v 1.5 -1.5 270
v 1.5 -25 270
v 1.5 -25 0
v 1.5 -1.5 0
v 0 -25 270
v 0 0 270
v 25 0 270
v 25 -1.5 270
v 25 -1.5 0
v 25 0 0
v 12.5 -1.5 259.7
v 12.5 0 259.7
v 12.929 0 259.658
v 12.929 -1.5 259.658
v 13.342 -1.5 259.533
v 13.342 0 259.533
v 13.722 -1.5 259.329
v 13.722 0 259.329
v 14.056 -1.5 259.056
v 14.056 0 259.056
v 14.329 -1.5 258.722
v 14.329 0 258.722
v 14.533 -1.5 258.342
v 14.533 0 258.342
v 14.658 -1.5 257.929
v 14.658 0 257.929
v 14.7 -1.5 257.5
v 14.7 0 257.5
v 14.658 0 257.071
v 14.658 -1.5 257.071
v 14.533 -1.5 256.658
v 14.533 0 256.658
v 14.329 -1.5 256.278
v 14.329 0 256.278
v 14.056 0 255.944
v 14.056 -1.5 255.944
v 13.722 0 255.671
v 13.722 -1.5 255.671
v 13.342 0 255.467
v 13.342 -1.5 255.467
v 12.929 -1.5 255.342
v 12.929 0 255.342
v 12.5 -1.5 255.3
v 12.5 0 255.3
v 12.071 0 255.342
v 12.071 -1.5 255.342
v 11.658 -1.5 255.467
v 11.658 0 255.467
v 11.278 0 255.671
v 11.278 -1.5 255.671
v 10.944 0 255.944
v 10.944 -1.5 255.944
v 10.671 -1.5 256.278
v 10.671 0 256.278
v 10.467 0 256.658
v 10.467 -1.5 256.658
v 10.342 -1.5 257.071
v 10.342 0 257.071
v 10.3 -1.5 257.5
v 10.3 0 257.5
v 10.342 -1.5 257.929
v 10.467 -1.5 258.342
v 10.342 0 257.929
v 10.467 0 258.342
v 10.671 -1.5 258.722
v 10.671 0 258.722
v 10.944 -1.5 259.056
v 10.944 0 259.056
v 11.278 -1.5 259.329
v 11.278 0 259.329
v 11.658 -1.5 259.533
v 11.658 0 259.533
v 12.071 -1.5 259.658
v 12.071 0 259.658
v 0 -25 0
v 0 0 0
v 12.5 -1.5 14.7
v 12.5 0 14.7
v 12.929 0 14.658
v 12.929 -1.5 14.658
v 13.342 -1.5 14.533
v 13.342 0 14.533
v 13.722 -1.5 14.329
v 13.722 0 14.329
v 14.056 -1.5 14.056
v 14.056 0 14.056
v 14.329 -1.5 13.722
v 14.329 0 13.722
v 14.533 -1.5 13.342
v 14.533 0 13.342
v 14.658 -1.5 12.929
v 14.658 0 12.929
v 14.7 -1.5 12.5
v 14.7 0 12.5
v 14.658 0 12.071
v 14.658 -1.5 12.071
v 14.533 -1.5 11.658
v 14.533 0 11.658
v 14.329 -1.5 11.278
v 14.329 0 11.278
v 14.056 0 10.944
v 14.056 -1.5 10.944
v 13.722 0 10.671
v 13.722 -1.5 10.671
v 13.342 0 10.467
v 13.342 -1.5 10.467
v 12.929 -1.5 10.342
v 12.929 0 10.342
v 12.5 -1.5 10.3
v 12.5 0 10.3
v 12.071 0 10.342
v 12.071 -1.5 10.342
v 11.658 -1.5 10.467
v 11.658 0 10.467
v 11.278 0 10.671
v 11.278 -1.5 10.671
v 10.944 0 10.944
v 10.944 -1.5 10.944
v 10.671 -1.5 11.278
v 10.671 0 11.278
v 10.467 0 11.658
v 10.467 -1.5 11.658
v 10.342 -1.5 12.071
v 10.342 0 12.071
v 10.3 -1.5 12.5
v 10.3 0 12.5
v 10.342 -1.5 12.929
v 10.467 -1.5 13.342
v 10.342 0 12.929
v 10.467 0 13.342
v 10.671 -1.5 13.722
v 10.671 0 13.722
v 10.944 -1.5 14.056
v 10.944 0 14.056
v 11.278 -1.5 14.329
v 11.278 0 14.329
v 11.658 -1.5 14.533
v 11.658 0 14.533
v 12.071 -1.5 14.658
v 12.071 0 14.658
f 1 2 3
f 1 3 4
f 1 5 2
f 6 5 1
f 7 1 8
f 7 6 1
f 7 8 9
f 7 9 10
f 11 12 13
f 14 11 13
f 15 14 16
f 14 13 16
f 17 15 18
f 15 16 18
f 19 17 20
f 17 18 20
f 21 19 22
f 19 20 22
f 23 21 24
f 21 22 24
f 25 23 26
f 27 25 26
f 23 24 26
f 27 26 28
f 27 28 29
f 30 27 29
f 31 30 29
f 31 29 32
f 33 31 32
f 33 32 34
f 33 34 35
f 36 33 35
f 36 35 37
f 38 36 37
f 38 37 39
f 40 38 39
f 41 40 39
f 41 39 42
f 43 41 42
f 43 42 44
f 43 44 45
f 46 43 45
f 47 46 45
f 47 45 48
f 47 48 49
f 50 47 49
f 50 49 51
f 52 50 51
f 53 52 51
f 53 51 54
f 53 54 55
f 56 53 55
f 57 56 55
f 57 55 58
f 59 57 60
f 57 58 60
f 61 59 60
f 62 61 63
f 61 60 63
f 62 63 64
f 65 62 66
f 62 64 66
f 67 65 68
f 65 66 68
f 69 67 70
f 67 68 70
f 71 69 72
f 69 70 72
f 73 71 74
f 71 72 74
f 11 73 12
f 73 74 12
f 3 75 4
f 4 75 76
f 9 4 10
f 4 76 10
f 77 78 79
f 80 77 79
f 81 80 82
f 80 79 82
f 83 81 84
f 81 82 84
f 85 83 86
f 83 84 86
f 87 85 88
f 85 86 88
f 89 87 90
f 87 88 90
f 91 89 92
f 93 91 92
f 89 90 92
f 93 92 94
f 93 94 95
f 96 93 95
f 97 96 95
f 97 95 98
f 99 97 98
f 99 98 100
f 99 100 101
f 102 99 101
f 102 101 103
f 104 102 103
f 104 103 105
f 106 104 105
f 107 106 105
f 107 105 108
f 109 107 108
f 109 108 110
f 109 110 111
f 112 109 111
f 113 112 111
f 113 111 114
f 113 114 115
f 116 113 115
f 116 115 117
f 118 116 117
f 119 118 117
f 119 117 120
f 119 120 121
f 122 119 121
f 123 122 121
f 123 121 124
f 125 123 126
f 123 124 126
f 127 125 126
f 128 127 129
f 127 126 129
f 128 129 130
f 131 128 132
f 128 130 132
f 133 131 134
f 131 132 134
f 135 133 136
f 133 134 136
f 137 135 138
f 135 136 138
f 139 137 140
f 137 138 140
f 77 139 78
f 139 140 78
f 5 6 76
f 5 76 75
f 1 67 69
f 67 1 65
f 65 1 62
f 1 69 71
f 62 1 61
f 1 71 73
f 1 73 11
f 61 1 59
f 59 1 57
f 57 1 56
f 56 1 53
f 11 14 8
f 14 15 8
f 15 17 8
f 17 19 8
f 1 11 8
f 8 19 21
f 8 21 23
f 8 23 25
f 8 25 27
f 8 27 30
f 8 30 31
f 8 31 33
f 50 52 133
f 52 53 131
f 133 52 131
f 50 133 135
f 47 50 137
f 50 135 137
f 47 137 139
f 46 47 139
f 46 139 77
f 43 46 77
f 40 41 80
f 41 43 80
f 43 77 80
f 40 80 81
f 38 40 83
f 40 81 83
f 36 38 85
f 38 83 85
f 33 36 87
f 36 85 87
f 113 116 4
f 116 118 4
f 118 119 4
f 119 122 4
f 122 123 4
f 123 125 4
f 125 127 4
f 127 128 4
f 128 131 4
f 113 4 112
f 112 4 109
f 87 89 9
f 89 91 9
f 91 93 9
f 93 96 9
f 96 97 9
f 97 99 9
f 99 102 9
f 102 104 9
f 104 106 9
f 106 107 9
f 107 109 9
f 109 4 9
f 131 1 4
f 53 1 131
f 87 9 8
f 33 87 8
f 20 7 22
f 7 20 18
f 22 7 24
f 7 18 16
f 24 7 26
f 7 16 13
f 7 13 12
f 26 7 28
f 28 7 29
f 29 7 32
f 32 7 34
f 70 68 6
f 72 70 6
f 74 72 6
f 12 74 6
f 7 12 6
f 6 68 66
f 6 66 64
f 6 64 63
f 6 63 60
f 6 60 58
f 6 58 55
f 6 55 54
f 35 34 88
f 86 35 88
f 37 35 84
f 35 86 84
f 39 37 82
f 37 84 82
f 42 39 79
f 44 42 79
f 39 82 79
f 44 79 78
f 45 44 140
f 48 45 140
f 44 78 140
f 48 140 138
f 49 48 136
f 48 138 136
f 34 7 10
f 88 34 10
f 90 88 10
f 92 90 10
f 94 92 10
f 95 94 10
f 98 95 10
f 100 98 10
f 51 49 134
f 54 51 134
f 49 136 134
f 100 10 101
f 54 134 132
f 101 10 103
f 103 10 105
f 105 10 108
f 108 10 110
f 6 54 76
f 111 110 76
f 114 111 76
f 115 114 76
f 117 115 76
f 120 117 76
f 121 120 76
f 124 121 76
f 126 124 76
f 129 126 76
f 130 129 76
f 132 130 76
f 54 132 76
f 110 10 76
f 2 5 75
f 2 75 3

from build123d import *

# Parameters (mm, degrees)
EXTRUDE_1_DEPTH     = 270
CUT_EXTRUDE_1_REACH = 274.305
SKETCH_2_R          = 2.2


with BuildPart() as part:
    # Эскиз1 → Бобышка-Вытянуть1 (new body)
    with BuildSketch(Plane.XY):
        Polygon((0, 0), (0, -25), (1.5, -25), (1.5, -1.5), (25, -1.5), (25, 0), align=None)
    extrude(amount=EXTRUDE_1_DEPTH)

    # Эскиз2 → Вырез-Вытянуть1 (cut, up to next)
    with BuildSketch(Plane(origin=(0, 0, 0), x_dir=(1, 0, 0), z_dir=(0, 1, 0)), mode=Mode.PRIVATE) as cut_extrude_1_sk1:
        with Locations(Location((12.5, -257.5, 0), (0, 0, 270))):
            Circle(SKETCH_2_R)
    cut_extrude_1_tool1 = extrude(cut_extrude_1_sk1.sketch, amount=-CUT_EXTRUDE_1_REACH, mode=Mode.PRIVATE) & part.part
    # Эскиз2 → Вырез-Вытянуть1 (cut, up to next)
    with BuildSketch(Plane(origin=(0, 0, 0), x_dir=(1, 0, 0), z_dir=(0, 1, 0)), mode=Mode.PRIVATE) as cut_extrude_1_sk2:
        with Locations(Location((12.5, -12.5, 0), (0, 0, 270))):
            Circle(SKETCH_2_R)
    cut_extrude_1_tool2 = extrude(cut_extrude_1_sk2.sketch, amount=-CUT_EXTRUDE_1_REACH, mode=Mode.PRIVATE) & part.part
    add(cut_extrude_1_tool1.solids().sort_by_distance((12.5, 0, 257.5))[0], mode=Mode.SUBTRACT)
    add(cut_extrude_1_tool2.solids().sort_by_distance((12.5, 0, 12.5))[0], mode=Mode.SUBTRACT)


solid = part.part
